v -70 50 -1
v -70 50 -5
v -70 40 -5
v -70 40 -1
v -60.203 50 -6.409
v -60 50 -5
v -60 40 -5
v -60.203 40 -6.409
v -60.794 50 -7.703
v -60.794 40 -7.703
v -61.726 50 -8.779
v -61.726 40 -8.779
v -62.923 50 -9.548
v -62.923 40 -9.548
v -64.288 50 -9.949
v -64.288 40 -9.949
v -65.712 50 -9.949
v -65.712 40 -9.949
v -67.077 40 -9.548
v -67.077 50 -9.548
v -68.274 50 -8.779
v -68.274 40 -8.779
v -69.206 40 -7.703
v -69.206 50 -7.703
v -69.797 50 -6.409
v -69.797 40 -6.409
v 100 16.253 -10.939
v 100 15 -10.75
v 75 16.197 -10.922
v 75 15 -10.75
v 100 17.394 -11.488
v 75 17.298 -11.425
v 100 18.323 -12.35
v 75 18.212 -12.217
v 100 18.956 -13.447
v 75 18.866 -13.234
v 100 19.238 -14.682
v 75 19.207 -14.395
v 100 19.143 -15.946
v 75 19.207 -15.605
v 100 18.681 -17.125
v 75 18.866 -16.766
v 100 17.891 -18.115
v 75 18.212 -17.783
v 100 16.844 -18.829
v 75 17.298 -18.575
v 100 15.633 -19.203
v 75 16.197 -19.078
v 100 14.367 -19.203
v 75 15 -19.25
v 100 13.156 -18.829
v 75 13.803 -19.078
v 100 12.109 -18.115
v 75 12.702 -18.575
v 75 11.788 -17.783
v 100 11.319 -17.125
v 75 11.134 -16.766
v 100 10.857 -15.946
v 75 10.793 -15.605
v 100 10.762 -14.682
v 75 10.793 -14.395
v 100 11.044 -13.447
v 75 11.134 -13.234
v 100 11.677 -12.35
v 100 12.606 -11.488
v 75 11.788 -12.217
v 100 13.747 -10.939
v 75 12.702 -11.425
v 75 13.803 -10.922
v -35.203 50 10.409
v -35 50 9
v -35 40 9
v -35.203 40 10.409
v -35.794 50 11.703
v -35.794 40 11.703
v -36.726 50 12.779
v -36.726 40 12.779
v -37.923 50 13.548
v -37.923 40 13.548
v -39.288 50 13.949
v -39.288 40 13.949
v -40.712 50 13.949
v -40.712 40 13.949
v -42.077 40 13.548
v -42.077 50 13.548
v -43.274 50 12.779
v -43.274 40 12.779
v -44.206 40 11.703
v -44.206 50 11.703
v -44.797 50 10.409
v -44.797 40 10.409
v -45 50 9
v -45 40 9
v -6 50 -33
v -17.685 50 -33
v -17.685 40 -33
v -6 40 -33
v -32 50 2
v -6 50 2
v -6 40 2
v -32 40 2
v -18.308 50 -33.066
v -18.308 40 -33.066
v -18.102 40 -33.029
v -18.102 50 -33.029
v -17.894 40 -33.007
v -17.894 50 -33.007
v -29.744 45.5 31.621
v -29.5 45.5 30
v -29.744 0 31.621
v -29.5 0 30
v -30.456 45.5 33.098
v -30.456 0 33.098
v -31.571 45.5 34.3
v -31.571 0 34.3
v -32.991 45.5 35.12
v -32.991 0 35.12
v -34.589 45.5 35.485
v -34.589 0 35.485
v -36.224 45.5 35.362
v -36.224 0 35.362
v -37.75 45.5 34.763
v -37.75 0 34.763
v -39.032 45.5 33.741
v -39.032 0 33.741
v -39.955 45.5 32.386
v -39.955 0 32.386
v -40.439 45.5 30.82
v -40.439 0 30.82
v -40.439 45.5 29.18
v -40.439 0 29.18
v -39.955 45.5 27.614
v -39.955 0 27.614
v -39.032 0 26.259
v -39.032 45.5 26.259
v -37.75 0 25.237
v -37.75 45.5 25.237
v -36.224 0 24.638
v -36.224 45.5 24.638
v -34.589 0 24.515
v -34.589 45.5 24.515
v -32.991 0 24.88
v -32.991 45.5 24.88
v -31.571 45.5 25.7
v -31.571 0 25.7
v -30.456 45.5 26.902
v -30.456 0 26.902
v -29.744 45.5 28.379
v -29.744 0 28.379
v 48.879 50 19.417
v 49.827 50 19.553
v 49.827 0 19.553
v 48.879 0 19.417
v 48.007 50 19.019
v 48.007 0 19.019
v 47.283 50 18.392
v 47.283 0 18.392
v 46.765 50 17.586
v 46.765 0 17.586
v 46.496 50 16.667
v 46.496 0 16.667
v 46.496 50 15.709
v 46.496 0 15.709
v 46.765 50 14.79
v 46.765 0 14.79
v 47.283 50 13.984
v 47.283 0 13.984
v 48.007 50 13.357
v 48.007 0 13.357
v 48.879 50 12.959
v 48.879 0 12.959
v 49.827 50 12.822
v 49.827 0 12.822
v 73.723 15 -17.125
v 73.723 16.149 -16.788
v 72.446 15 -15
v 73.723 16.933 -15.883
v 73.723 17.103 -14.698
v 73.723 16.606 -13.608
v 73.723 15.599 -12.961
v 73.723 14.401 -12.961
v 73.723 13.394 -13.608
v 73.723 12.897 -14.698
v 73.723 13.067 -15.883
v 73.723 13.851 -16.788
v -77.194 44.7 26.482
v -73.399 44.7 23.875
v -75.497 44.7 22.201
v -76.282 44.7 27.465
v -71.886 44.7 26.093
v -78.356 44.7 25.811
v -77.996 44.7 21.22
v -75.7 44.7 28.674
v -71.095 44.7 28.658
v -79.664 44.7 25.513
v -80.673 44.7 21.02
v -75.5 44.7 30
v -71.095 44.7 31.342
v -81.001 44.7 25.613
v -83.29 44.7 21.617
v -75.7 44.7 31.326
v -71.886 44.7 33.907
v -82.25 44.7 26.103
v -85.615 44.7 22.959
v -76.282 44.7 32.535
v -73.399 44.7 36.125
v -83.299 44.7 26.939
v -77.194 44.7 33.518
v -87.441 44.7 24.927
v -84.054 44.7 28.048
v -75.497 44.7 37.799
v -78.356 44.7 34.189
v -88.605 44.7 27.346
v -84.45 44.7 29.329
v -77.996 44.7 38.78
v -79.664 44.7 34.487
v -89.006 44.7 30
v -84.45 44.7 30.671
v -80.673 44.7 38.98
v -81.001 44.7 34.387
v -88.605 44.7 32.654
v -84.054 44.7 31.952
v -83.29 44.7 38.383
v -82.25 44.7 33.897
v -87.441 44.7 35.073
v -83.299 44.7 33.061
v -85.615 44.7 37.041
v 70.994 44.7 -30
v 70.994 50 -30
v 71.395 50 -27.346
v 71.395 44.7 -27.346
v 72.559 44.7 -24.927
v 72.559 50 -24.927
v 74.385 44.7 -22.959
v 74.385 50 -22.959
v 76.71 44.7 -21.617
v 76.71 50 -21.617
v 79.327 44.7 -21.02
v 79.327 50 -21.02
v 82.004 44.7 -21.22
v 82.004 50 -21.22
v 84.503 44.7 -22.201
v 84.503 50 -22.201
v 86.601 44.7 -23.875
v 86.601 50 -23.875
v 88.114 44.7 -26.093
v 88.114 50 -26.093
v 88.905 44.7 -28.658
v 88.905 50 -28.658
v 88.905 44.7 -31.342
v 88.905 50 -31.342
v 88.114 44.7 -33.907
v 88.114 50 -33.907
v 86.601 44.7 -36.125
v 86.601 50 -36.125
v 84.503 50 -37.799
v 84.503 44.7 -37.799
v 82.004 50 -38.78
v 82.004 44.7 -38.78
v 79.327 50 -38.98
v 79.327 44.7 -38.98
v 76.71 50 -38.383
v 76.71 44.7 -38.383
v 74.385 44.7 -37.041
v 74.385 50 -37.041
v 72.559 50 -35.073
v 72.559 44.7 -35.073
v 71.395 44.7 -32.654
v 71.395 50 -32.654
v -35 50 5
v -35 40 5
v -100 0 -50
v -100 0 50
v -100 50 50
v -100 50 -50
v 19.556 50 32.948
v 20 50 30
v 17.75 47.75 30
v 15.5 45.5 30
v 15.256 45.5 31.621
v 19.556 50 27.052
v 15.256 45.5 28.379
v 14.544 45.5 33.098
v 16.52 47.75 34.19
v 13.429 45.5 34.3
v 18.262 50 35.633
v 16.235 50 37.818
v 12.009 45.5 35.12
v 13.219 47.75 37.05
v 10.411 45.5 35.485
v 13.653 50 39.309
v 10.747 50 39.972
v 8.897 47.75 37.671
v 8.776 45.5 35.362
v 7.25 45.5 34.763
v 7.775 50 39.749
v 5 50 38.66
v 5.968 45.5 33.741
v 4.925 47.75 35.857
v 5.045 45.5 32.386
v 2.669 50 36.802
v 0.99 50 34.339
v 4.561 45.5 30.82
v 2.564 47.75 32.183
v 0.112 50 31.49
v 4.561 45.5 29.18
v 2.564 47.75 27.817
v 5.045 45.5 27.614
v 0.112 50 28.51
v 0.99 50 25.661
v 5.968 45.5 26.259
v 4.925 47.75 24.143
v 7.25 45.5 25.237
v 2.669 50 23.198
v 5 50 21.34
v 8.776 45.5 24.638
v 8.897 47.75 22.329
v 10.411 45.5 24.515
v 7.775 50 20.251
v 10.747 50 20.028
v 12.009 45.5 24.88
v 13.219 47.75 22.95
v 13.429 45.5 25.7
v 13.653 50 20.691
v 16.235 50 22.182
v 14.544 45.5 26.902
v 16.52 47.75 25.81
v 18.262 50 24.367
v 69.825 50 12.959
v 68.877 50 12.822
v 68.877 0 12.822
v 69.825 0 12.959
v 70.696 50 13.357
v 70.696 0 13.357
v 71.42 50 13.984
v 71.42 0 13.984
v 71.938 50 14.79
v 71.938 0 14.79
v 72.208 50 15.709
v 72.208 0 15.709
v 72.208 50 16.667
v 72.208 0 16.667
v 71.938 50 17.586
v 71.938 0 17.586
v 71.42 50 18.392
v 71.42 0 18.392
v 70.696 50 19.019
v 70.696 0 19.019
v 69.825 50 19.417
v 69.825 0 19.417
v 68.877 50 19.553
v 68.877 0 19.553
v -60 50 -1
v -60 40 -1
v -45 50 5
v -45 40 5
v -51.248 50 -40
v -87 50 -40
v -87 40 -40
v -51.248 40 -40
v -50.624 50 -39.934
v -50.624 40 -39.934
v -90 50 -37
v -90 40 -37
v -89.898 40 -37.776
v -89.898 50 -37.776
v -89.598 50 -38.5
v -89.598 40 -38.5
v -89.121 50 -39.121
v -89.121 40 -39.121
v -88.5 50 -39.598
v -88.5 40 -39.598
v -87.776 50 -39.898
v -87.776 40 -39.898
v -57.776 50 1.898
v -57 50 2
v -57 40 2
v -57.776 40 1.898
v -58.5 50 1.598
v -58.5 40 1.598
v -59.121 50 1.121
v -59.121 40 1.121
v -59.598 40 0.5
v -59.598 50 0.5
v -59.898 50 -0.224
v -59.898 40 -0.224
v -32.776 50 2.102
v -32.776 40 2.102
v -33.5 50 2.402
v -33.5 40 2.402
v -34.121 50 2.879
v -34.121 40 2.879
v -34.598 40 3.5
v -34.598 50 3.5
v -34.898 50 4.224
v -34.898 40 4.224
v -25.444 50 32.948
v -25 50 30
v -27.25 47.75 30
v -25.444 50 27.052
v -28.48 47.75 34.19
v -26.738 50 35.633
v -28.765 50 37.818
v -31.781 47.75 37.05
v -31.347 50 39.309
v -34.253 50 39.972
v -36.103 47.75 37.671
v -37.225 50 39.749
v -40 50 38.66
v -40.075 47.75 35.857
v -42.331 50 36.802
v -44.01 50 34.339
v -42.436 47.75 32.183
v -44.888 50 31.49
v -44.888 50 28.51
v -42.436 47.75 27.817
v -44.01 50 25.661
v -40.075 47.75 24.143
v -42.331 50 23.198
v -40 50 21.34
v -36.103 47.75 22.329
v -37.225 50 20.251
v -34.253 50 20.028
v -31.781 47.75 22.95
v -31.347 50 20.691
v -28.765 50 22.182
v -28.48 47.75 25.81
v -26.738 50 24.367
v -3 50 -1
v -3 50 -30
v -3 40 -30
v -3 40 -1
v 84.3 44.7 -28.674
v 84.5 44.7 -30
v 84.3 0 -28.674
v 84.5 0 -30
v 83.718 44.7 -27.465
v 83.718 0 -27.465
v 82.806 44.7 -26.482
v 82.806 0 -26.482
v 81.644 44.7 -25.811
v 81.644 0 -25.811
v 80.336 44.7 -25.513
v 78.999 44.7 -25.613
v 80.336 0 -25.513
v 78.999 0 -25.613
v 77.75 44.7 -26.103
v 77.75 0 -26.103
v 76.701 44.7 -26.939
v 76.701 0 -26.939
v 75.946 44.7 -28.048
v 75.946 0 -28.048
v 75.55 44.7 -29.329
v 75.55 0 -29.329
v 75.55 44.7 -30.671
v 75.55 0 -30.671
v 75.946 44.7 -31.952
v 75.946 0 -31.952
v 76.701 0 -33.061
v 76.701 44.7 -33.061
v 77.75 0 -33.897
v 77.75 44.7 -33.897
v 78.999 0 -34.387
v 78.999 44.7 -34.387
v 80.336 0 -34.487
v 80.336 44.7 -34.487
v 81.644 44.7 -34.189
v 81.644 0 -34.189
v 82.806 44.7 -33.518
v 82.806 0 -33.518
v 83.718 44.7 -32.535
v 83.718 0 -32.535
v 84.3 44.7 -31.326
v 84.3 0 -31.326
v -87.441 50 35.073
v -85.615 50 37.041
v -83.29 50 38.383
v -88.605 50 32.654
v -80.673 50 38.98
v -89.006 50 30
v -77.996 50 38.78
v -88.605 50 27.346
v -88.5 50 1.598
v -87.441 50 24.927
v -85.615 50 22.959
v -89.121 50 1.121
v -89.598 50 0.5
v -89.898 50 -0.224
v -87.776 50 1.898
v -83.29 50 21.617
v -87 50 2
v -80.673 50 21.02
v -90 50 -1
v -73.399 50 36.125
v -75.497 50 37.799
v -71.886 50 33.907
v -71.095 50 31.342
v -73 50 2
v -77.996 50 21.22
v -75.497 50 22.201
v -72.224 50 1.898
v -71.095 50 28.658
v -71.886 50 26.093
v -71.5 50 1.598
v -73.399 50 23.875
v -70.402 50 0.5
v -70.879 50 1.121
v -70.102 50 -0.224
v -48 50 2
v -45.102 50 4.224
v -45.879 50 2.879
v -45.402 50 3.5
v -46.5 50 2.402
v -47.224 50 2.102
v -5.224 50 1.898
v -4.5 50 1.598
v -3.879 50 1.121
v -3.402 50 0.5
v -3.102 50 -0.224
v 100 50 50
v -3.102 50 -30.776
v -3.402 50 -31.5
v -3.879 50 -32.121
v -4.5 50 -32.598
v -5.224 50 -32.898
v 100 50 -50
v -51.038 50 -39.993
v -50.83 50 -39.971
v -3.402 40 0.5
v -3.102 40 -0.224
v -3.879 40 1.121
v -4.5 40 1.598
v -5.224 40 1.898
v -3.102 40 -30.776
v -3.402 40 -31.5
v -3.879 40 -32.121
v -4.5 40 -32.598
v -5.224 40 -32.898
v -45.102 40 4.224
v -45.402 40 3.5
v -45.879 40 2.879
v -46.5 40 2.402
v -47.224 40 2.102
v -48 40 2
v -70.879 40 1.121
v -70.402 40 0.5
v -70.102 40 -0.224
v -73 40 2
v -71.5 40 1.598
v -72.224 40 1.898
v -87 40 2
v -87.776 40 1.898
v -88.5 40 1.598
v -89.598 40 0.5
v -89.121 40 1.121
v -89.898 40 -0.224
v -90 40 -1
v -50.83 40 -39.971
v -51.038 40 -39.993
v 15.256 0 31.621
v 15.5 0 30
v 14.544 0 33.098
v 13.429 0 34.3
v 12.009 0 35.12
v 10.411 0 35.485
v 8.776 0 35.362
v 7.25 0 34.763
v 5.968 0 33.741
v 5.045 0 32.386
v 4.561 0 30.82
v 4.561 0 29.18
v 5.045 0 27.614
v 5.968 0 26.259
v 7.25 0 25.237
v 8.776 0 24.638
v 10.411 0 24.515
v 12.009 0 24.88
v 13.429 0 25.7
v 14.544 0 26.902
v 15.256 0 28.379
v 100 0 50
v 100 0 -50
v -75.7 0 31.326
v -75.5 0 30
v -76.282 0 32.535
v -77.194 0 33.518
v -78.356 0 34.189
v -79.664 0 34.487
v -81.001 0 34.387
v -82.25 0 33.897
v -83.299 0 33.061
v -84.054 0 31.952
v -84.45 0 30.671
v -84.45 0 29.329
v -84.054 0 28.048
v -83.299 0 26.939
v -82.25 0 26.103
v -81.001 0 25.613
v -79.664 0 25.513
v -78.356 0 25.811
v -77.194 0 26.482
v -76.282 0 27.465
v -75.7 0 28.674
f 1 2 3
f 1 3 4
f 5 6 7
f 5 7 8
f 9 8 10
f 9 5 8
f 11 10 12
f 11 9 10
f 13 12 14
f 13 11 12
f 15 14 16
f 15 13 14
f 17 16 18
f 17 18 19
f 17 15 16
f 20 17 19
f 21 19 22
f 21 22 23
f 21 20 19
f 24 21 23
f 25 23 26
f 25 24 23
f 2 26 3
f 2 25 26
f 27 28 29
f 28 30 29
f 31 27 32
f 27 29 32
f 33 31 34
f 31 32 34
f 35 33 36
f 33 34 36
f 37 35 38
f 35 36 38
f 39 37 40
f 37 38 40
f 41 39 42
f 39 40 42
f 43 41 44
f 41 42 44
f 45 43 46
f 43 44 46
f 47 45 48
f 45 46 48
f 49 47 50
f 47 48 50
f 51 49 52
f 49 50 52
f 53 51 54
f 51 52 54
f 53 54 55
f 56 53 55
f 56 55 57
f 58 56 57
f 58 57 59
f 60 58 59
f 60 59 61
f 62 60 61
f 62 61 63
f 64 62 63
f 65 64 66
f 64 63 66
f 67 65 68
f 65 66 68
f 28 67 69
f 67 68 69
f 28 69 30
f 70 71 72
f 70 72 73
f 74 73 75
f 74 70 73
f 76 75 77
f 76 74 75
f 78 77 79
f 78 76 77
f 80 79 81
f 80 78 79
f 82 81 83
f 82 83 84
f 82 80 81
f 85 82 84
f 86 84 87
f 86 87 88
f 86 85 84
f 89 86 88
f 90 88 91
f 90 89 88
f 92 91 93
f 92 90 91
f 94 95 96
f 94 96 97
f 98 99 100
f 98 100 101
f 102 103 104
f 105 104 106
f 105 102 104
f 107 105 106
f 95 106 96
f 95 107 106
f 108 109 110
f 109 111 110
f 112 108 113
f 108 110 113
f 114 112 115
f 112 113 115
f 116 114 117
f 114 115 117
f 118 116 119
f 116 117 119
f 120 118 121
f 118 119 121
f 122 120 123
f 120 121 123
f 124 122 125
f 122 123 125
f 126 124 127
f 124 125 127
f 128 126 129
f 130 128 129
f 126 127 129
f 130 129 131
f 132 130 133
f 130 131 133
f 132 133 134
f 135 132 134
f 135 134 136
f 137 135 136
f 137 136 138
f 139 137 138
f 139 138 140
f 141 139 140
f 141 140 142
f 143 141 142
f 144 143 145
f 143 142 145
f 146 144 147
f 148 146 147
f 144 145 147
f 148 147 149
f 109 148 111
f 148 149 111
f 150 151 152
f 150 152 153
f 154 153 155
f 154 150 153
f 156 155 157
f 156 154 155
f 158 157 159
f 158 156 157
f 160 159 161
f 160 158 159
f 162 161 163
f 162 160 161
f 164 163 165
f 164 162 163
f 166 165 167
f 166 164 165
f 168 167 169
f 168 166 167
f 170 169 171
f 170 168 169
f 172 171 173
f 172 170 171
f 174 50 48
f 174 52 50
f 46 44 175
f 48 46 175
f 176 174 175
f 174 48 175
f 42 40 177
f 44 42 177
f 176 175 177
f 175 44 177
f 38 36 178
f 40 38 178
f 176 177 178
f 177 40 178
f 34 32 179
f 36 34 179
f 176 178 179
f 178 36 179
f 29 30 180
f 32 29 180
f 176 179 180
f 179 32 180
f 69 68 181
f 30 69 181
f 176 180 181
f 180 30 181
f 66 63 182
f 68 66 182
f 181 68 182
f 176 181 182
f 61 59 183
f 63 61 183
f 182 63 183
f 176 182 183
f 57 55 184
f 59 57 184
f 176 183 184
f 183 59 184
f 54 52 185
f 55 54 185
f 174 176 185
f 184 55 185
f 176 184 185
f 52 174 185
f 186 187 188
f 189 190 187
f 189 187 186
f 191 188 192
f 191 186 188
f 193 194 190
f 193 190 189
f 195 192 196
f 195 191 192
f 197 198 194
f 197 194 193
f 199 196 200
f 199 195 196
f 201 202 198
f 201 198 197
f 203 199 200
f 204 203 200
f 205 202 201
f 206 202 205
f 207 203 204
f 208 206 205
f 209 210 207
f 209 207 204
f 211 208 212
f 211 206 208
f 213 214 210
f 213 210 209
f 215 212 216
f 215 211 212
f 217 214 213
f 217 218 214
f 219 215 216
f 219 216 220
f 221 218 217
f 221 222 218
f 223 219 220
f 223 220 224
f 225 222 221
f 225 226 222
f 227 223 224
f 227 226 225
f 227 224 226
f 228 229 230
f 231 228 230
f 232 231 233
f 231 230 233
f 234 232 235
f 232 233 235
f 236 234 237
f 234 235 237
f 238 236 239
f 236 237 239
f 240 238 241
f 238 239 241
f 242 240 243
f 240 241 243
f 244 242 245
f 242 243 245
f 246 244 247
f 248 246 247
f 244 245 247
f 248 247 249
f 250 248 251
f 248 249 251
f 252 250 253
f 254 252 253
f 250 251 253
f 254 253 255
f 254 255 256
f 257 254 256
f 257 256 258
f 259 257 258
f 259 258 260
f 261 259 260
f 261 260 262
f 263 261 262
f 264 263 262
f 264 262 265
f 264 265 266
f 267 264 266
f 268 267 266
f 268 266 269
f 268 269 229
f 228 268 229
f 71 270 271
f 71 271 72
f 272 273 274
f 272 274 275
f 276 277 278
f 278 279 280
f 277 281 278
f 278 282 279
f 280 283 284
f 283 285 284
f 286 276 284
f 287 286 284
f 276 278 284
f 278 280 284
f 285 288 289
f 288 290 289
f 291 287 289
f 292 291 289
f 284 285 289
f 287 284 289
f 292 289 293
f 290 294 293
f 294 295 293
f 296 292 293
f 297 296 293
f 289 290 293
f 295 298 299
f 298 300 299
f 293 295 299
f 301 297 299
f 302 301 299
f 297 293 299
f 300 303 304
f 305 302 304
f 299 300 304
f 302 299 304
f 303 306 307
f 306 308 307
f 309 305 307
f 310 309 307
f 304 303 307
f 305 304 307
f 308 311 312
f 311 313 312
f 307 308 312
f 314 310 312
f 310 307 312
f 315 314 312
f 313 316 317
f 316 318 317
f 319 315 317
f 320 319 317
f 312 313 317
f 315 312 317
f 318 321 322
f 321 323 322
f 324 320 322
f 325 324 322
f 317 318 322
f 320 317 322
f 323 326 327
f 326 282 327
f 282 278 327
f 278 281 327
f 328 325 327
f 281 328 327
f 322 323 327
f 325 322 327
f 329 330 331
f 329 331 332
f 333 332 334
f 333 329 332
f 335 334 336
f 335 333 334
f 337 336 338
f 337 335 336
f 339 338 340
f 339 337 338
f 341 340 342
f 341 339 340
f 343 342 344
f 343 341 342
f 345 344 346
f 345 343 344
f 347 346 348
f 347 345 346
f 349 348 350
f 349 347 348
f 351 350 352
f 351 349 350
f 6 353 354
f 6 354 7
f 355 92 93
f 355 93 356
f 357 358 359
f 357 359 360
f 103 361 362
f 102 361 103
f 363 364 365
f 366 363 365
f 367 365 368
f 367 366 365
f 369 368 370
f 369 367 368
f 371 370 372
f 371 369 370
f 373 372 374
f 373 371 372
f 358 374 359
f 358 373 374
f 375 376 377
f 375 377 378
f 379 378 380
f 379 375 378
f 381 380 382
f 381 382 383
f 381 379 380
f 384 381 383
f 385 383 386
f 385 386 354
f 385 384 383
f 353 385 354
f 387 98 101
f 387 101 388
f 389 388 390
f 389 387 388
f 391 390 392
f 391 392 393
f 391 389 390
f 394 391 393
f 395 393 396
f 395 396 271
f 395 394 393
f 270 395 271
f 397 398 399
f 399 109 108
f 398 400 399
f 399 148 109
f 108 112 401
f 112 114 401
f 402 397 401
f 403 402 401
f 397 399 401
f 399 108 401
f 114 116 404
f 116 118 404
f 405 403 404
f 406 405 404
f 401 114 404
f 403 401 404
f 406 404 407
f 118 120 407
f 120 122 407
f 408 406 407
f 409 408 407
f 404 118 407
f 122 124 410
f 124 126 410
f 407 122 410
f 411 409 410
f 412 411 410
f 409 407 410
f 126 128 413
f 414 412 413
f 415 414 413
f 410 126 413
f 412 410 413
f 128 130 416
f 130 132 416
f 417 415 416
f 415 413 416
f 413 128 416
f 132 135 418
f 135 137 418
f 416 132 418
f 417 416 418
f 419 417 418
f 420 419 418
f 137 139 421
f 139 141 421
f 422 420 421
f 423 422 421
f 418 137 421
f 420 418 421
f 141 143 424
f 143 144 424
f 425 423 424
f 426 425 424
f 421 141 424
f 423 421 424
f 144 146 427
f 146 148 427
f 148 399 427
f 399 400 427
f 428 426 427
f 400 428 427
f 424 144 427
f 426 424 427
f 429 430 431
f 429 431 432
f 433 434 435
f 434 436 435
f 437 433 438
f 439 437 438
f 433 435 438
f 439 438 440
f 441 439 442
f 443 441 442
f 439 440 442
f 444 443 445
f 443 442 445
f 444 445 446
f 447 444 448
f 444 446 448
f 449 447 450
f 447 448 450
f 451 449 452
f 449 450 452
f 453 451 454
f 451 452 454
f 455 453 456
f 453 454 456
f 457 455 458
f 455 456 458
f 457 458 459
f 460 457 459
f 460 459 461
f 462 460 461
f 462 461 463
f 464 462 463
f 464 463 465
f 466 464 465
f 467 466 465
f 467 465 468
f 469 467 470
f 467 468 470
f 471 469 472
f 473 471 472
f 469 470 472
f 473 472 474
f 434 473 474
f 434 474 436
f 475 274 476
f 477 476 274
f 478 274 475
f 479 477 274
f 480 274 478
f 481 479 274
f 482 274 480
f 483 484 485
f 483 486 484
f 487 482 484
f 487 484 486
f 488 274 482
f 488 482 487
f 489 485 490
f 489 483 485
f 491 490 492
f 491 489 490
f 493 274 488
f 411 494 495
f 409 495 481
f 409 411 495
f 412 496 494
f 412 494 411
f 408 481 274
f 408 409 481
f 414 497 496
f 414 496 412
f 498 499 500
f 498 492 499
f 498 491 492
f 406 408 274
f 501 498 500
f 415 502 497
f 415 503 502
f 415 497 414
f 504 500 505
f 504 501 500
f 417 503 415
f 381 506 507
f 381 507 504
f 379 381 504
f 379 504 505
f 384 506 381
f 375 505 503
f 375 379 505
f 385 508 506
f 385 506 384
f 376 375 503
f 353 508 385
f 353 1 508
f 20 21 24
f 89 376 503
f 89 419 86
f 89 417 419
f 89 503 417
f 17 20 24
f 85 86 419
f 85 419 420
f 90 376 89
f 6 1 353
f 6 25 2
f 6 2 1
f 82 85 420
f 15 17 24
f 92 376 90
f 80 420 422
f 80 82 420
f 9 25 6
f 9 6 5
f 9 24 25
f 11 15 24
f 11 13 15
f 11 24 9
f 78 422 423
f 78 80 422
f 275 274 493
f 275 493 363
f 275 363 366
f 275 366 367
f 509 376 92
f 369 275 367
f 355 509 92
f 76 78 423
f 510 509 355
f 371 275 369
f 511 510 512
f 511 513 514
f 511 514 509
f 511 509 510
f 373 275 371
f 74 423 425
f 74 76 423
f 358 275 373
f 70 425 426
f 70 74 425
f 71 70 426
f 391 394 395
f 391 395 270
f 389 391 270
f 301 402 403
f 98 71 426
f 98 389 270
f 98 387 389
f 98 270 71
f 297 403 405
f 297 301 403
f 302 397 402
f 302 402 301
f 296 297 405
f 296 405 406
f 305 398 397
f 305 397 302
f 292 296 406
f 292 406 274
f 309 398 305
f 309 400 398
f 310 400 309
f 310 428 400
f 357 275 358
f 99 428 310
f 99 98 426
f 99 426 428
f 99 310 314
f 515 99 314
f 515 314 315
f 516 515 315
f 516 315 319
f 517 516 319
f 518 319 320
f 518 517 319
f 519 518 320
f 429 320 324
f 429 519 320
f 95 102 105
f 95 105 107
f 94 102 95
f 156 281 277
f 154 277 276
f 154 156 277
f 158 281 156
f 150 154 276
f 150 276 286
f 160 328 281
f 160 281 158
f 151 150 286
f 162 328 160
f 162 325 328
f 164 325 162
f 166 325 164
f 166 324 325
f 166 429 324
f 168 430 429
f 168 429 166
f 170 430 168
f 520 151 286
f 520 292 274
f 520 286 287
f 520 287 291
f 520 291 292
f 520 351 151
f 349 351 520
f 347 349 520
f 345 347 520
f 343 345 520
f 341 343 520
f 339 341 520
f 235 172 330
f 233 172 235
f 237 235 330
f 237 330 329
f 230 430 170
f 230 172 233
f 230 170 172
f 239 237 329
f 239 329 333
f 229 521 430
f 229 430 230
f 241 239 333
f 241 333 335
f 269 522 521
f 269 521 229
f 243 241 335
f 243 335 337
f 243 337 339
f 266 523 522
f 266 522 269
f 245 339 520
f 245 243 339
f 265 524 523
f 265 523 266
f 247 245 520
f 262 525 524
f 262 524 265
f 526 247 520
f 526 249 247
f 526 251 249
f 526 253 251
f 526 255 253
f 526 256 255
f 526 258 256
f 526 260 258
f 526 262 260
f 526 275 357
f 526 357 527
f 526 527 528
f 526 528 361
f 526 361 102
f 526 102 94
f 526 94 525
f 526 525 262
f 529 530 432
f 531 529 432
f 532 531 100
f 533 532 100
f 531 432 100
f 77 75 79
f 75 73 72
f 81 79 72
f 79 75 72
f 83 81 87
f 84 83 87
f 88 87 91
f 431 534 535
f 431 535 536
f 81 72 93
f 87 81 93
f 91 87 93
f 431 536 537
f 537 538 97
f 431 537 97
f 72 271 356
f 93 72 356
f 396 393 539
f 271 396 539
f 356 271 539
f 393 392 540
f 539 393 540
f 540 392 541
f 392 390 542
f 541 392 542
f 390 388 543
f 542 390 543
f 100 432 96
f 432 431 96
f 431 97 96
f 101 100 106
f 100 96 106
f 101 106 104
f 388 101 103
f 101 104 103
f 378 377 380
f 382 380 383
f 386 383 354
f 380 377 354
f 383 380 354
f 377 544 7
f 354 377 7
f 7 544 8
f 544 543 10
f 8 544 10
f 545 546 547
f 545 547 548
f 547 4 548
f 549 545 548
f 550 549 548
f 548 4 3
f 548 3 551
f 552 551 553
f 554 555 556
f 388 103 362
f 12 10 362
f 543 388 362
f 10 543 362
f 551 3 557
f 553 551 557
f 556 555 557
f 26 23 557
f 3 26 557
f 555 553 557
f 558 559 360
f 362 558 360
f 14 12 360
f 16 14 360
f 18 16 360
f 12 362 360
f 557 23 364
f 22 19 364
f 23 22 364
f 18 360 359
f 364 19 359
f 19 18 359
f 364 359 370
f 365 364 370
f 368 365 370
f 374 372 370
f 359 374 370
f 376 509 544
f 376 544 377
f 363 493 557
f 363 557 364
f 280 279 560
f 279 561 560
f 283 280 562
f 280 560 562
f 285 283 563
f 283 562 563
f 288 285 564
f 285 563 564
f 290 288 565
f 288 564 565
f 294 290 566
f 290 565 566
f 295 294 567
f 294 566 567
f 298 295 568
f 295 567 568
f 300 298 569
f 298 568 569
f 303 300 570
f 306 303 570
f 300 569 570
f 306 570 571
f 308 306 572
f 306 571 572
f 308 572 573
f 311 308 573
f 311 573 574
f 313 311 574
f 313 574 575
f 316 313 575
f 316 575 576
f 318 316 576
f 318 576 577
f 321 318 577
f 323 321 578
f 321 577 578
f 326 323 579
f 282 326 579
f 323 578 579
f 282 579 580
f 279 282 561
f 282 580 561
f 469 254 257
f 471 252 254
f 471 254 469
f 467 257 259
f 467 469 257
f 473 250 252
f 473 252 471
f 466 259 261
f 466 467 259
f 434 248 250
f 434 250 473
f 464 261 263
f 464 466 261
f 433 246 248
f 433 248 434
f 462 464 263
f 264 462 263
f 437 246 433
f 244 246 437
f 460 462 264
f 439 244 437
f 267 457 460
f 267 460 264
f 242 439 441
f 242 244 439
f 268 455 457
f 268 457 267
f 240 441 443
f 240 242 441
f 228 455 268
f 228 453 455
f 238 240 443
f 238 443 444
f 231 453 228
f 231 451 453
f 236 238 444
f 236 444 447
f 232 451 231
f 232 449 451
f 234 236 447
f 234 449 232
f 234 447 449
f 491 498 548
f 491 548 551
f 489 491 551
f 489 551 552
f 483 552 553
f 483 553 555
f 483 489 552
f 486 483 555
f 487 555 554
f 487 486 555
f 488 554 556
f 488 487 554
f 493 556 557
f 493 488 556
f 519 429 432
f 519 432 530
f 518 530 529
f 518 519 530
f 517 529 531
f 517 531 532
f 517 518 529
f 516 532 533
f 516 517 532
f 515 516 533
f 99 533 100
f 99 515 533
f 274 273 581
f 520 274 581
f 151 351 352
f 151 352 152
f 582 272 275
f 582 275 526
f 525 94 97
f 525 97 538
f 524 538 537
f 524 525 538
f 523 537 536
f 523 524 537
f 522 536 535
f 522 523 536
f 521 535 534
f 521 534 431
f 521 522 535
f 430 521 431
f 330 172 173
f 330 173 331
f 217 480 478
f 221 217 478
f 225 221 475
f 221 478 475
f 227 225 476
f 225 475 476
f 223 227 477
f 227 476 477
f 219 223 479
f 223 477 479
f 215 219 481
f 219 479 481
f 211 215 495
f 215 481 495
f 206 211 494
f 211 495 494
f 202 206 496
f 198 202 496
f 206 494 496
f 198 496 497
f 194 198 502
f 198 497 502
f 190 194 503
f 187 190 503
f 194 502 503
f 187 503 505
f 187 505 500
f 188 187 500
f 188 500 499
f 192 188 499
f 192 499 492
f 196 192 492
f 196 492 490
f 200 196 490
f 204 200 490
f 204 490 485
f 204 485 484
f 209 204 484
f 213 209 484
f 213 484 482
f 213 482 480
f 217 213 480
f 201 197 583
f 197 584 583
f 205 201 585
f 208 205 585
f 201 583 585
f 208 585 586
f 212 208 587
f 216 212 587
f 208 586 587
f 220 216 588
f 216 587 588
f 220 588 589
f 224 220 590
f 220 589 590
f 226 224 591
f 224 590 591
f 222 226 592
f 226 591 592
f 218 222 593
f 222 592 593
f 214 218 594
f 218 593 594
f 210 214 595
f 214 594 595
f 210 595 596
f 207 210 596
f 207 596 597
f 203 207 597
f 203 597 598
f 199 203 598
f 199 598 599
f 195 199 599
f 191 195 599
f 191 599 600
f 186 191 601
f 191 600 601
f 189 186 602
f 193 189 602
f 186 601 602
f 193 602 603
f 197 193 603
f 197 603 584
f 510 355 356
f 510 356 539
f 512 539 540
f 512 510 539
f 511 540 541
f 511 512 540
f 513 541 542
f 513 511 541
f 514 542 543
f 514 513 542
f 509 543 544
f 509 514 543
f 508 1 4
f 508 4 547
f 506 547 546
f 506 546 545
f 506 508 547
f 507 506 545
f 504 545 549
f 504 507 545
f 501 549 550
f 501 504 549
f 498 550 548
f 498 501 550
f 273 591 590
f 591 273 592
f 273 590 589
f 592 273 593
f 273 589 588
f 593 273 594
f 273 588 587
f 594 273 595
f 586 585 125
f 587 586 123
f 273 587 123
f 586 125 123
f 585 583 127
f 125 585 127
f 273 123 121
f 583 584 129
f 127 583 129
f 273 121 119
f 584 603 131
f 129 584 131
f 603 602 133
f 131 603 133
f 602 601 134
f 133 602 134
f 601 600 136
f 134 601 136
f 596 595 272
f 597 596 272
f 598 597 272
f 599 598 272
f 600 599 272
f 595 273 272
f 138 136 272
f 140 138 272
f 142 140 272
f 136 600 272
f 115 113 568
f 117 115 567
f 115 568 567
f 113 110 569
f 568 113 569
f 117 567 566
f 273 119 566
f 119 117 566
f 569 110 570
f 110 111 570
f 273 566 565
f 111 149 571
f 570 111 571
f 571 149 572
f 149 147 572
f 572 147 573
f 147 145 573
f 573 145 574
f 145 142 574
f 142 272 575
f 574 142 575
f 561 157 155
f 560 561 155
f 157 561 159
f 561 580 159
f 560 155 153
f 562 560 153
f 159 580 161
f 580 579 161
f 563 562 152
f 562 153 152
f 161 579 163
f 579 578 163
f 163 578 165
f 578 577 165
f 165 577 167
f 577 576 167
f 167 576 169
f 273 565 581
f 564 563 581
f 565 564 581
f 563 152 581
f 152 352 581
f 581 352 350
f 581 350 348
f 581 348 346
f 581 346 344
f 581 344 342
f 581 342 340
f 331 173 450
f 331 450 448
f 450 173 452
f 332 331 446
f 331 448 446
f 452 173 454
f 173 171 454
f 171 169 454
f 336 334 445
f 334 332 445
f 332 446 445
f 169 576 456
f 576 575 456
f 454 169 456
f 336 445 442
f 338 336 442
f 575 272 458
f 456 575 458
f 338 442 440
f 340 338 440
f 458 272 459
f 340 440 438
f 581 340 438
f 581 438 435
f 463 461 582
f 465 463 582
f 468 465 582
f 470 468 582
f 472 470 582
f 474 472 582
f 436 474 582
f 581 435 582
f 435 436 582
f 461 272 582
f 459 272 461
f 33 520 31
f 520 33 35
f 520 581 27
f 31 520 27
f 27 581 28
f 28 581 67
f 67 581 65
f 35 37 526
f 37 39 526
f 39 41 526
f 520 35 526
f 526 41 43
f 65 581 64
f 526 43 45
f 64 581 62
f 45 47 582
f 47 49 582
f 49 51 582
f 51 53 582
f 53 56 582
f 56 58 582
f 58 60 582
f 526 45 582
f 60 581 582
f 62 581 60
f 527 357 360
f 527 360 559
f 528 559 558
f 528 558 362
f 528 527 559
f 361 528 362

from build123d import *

# Parameters (mm, degrees)
SKETCH1_W                                            = 200
SKETCH1_H                                            = 100
BLOCK_STOCK_DEPTH                                    = 50
M10_TAPPED_HOLE1_D                                   = 8.5
M10_TAPPED_HOLE1_DEPTH                               = 25
M10_TAPPED_HOLE1_TIP                                 = 2.553657631
CBORE_FOR_M8_HEX_HEAD_BOLT1_D                        = 9
CBORE_FOR_M8_HEX_HEAD_BOLT1_CBORE_D                  = 18.011
CBORE_FOR_M8_HEX_HEAD_BOLT1_CBORE_DEPTH              = 5.3
POCKET_1_DEPTH                                       = 10
CSK_FOR_M10_CROSS_RECESS_FLAT_HEAD_SCREW_D           = 11
CSK_FOR_M10_CROSS_RECESS_FLAT_HEAD_SCREW_CSINK_D     = 20
CSK_FOR_M10_CROSS_RECESS_FLAT_HEAD_SCREW_CSINK_ANGLE = 90
SLOT_DEPTH                                           = 398.580729973


with BuildPart() as part:
    # Sketch1 → Block Stock (new body)
    with BuildSketch(Plane(origin=(0, 0, 0), x_dir=(1, 0, 0), z_dir=(0, 1, 0))):
        Rectangle(SKETCH1_W, SKETCH1_H)
    extrude(amount=BLOCK_STOCK_DEPTH)

    # M10 Tapped Hole1
    with Locations(Plane(origin=(100, 0, 0), x_dir=(0, 0, -1), z_dir=(1, 0, 0))):
        with Locations((15, 15)):
            Hole(M10_TAPPED_HOLE1_D / 2, depth=M10_TAPPED_HOLE1_DEPTH)
            with Locations((0, 0, -(M10_TAPPED_HOLE1_DEPTH + M10_TAPPED_HOLE1_TIP / 2))):  # 118° drill point
                Cone(0, M10_TAPPED_HOLE1_D / 2, M10_TAPPED_HOLE1_TIP, mode=Mode.SUBTRACT)

    # CBORE for M8 Hex Head Bolt1 (through all)
    with Locations(Plane(origin=(0, 50, 0), x_dir=(-1, 0, 0), z_dir=(0, 1, 0))):
        with Locations((80, 30), (-80, -30)):
            CounterBoreHole(CBORE_FOR_M8_HEX_HEAD_BOLT1_D / 2, CBORE_FOR_M8_HEX_HEAD_BOLT1_CBORE_D / 2, CBORE_FOR_M8_HEX_HEAD_BOLT1_CBORE_DEPTH)

    # Sketch2 → Pocket 1 (cut)
    with BuildSketch(Plane(origin=(0, 50, 0), x_dir=(1, 0, 0), z_dir=(0, 1, 0))):
        with BuildLine():
            Line((-87, 40), (-51.247723472, 40))
            ThreePointArc((-51.247723472, 40), (-50.934138082, 39.983565686), (-50.6239884, 39.934442802))
            Line((-50.6239884, 39.934442802), (-18.308422367, 33.065557198))
            ThreePointArc((-18.308422367, 33.065557198), (-17.998272684, 33.016434314), (-17.684687294, 33))
            Line((-17.684687294, 33), (-6, 33))
            ThreePointArc((-6, 33), (-3.878679656, 32.121320344), (-3, 30))
            Line((-3, 30), (-3, 1))
            ThreePointArc((-3, 1), (-3.878679656, -1.121320344), (-6, -2))
            Line((-6, -2), (-32, -2))
            ThreePointArc((-32, -2), (-34.121320344, -2.878679656), (-35, -5))
            Line((-35, -5), (-35, -9))
            ThreePointArc((-35, -9), (-40, -14), (-45, -9))
            Line((-45, -9), (-45, -5))
            ThreePointArc((-45, -5), (-45.878679656, -2.878679656), (-48, -2))
            Line((-48, -2), (-57, -2))
            ThreePointArc((-57, -2), (-59.121320344, -1.121320344), (-60, 1))
            Line((-60, 1), (-60, 5))
            ThreePointArc((-60, 5), (-65, 10), (-70, 5))
            Line((-70, 5), (-70, 1))
            ThreePointArc((-70, 1), (-70.878679656, -1.121320344), (-73, -2))
            Line((-73, -2), (-87, -2))
            ThreePointArc((-87, -2), (-89.121320344, -1.121320344), (-90, 1))
            Line((-90, 1), (-90, 37))
            ThreePointArc((-90, 37), (-89.121320344, 39.121320344), (-87, 40))
        make_face()
    extrude(amount=-POCKET_1_DEPTH, mode=Mode.SUBTRACT)

    # CSK for M10 Cross Recess Flat Head Screw1 (through all)
    with Locations(Plane(origin=(0, 50, 0), x_dir=(-1, 0, 0), z_dir=(0, 1, 0))):
        with Locations((-10, 30), (35, 30)):
            CounterSinkHole(CSK_FOR_M10_CROSS_RECESS_FLAT_HEAD_SCREW_D / 2, CSK_FOR_M10_CROSS_RECESS_FLAT_HEAD_SCREW_CSINK_D / 2, counter_sink_angle=CSK_FOR_M10_CROSS_RECESS_FLAT_HEAD_SCREW_CSINK_ANGLE)

    # SlotSke → Slot (cut, through all)
    with BuildSketch(Plane(origin=(218.703654527, 50, 182.375595614), x_dir=(1, 0, 0), z_dir=(0, 1, 0))):
        with BuildLine():
            Line((-149.826827264, 162.822297807), (-168.876827264, 162.822297807))
            ThreePointArc((-168.876827264, 162.822297807), (-172.242327264, 166.187797807), (-168.876827264, 169.553297807))
            Line((-168.876827264, 169.553297807), (-149.826827264, 169.553297807))
            ThreePointArc((-149.826827264, 169.553297807), (-146.461327264, 166.187797807), (-149.826827264, 162.822297807))
        make_face()
    extrude(amount=-SLOT_DEPTH, mode=Mode.SUBTRACT)


solid = part.part
